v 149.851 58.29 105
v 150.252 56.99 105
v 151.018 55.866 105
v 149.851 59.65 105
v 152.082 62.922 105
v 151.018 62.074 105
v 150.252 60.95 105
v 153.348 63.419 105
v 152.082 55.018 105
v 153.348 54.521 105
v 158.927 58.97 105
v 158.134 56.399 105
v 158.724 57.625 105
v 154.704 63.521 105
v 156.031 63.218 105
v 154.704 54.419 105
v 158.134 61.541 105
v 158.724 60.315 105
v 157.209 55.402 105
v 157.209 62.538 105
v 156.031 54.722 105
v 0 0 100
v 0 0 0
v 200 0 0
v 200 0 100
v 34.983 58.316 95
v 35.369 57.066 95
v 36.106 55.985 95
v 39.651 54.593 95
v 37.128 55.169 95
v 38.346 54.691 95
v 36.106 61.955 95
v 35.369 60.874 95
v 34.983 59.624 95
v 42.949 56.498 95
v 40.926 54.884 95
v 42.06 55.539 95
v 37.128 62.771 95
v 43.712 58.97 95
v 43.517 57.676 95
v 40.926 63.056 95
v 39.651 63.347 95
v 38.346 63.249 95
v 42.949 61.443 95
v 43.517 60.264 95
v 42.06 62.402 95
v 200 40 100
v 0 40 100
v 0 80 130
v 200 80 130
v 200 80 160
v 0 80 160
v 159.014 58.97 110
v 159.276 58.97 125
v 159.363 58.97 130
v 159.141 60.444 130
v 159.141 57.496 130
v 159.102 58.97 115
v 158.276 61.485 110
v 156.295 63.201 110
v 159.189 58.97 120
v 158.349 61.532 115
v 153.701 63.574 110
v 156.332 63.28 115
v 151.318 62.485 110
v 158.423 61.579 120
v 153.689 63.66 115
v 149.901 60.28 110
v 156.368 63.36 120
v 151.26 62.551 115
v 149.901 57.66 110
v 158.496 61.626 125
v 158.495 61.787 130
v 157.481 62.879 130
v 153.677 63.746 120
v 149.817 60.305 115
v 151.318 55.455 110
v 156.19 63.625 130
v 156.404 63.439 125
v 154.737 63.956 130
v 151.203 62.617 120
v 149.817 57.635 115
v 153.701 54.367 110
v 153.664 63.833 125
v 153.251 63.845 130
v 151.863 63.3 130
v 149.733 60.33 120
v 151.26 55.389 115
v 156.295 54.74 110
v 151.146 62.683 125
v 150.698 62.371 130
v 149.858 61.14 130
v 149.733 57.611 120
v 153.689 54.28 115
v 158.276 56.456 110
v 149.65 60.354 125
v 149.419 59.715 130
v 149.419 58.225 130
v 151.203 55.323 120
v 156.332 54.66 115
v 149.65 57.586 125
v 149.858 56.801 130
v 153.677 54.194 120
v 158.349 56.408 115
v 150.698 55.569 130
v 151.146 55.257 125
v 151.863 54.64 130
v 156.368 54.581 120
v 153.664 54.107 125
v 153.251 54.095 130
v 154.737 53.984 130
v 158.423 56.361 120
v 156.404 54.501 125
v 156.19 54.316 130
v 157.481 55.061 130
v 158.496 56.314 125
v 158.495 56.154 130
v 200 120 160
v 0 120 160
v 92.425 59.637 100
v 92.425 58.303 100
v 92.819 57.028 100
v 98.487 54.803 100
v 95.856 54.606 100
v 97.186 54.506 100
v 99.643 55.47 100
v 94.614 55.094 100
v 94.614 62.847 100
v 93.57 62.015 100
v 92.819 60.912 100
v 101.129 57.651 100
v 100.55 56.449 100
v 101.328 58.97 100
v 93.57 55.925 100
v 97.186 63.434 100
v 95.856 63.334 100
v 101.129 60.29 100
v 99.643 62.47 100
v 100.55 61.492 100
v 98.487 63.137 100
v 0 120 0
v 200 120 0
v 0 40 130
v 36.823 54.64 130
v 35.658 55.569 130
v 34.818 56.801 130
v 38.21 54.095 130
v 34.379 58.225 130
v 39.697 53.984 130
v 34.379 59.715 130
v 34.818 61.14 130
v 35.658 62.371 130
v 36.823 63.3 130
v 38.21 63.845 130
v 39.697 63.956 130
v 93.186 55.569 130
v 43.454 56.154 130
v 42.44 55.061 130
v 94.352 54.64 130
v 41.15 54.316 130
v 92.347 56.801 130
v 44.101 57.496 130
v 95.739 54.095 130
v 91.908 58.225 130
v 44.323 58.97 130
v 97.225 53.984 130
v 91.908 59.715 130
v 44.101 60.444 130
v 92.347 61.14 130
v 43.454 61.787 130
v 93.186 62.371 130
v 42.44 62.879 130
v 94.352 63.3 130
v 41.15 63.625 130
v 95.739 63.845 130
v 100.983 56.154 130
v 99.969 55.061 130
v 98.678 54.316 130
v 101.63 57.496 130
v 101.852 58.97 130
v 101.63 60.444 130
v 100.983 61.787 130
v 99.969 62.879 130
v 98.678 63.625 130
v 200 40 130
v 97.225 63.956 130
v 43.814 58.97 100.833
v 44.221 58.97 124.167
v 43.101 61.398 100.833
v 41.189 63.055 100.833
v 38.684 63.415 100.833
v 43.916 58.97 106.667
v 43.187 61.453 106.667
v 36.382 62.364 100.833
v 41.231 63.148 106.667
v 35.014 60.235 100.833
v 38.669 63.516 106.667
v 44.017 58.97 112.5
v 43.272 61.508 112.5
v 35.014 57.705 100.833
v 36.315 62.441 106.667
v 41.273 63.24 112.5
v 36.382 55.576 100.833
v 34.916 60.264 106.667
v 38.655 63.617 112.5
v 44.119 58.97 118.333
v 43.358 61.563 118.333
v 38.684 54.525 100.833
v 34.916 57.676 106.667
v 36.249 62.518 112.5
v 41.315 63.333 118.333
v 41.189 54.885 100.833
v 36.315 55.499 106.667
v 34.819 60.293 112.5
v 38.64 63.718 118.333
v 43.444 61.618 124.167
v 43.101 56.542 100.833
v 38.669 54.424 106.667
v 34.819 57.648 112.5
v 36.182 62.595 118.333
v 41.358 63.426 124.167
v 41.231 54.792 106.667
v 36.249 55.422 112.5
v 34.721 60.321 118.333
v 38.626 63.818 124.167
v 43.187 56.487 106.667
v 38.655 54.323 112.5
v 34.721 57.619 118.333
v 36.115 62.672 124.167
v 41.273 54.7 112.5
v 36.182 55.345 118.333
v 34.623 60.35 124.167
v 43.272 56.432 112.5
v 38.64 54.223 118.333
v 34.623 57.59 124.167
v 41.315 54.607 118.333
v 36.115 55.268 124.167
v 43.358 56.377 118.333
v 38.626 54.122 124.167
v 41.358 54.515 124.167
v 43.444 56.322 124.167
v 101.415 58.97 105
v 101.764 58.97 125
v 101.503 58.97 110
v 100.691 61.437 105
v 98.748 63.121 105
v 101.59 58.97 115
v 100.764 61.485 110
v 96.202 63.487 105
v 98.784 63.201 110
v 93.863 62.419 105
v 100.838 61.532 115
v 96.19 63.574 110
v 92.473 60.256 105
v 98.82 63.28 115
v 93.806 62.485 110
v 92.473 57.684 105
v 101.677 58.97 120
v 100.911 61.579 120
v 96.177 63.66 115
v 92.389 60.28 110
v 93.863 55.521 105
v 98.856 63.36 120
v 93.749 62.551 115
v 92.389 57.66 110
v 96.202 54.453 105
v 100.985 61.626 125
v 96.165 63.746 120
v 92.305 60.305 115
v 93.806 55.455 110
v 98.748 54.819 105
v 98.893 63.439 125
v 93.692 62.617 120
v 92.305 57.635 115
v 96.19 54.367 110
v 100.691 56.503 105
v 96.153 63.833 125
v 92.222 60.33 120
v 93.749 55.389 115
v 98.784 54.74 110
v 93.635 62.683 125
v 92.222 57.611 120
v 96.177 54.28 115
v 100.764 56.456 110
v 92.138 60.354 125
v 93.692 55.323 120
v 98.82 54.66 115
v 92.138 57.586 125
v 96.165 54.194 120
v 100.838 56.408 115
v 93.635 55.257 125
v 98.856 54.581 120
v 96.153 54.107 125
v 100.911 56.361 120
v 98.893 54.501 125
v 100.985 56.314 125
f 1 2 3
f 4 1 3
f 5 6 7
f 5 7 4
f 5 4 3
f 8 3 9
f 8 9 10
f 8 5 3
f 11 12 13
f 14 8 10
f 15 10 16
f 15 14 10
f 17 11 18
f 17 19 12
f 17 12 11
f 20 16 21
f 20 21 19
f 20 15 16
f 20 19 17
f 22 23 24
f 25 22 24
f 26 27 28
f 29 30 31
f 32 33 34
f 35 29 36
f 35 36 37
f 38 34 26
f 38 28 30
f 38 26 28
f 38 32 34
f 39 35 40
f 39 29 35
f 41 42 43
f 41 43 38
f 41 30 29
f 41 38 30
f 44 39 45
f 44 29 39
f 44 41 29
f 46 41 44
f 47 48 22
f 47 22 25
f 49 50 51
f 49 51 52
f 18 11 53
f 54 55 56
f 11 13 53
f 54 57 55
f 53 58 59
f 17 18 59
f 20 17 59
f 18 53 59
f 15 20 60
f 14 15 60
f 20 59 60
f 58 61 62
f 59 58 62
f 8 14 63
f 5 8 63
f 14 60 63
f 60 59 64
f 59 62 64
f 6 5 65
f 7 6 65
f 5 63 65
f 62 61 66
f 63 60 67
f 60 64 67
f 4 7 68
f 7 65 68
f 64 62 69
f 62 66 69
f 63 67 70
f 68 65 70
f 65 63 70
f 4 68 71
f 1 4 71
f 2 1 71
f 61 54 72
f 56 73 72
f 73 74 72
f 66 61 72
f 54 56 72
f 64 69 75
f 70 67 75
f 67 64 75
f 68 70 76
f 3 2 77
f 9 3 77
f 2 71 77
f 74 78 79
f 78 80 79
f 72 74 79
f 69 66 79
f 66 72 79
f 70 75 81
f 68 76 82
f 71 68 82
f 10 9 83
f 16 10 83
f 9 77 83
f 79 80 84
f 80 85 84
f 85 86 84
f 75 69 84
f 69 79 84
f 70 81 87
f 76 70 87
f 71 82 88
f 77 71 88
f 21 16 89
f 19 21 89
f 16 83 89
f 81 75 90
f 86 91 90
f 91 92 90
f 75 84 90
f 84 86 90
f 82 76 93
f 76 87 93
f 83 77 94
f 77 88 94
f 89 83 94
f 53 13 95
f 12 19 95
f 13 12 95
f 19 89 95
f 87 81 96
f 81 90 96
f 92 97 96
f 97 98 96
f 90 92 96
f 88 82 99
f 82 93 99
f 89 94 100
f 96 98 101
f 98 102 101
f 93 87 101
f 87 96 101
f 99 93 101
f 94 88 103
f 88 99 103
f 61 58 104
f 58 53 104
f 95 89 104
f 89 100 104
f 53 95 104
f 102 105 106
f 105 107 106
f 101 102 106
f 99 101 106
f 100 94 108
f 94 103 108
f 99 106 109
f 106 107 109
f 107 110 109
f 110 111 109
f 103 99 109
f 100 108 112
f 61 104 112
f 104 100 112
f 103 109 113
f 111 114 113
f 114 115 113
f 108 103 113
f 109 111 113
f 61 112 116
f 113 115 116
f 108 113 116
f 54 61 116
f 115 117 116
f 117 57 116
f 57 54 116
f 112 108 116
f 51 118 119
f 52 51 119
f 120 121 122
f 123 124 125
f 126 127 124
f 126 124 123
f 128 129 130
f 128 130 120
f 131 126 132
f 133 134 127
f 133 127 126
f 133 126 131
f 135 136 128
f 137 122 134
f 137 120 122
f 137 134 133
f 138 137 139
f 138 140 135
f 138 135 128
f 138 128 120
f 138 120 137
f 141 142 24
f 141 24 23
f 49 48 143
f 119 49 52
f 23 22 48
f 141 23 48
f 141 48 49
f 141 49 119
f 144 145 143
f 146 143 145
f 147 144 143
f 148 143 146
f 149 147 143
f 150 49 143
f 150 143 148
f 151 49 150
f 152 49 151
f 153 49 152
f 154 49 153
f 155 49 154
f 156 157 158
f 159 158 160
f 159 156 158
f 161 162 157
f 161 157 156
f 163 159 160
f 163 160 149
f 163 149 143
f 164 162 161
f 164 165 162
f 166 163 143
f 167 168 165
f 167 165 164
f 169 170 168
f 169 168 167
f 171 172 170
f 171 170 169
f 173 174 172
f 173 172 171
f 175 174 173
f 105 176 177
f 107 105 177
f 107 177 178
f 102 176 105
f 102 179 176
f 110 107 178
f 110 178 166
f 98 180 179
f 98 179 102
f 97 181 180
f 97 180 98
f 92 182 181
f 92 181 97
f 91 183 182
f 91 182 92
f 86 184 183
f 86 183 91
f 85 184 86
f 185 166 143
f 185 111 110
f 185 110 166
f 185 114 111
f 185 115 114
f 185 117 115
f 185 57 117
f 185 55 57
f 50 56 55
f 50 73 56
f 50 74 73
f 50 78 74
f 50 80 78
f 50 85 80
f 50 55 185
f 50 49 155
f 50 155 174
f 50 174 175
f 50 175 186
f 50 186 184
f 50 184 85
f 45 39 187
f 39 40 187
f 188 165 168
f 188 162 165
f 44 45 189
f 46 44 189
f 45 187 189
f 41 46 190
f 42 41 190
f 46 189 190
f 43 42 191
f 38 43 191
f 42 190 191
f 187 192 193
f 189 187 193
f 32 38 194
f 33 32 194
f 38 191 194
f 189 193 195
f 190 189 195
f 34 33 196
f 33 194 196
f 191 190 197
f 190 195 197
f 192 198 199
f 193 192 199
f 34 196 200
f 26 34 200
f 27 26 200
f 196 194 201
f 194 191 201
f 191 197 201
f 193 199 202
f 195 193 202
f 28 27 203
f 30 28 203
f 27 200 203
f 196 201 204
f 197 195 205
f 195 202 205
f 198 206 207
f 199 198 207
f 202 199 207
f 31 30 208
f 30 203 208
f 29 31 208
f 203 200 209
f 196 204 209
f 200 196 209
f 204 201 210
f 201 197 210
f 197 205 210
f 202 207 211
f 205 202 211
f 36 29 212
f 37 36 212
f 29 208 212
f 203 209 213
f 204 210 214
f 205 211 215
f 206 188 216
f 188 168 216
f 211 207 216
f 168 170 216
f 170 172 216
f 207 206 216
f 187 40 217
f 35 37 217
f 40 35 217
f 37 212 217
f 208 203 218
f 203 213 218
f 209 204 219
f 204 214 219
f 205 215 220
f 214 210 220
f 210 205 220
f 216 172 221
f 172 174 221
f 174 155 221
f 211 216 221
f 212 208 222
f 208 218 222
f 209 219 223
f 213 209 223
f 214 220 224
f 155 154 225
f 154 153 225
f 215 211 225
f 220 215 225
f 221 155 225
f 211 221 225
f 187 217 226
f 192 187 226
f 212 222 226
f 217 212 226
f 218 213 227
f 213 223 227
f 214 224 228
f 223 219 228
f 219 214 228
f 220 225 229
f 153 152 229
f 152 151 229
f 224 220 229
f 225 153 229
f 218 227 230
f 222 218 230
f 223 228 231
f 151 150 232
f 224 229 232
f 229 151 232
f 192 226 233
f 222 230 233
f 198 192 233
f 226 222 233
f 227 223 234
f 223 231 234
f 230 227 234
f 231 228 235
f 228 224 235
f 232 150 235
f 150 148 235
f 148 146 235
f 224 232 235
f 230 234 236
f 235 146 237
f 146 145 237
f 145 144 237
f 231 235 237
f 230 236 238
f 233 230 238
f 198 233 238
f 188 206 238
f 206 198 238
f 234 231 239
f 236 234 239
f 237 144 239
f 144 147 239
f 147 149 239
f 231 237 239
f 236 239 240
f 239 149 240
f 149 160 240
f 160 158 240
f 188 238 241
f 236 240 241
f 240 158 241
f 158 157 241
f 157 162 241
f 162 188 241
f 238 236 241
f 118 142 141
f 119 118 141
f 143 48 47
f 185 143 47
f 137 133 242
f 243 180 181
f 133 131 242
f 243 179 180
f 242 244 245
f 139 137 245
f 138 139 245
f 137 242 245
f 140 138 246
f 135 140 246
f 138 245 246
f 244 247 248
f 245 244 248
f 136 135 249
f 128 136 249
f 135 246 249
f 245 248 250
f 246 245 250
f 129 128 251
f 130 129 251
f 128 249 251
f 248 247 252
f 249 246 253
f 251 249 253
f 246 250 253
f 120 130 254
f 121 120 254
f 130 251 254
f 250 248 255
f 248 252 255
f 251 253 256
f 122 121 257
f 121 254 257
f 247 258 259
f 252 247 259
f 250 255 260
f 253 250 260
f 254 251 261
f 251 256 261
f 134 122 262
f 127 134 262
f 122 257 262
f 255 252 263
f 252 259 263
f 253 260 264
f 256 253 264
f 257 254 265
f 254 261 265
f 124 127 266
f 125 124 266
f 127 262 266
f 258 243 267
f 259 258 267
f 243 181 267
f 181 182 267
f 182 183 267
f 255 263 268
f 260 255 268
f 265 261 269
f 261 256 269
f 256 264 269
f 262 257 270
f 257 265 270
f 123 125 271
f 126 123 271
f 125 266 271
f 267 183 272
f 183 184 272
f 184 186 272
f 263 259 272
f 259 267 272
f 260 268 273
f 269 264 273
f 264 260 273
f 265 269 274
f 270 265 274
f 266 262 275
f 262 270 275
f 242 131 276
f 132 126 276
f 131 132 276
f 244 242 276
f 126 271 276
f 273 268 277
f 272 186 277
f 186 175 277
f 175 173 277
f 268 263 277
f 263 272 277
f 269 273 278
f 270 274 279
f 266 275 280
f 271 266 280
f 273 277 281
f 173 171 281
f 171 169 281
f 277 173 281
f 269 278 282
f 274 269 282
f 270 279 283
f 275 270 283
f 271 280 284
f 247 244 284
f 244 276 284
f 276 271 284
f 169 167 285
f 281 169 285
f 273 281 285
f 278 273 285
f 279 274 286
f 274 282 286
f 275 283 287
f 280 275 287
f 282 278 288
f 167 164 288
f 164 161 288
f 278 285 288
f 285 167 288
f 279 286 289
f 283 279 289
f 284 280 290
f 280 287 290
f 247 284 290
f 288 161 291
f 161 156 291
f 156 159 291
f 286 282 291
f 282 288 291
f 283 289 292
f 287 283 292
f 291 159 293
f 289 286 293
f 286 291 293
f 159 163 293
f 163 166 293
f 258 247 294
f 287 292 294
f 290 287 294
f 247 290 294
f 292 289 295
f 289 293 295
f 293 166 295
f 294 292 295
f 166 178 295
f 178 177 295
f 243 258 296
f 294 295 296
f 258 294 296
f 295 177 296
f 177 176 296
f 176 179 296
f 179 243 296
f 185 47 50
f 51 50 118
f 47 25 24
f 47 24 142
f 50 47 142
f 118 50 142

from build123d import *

# Parameters (mm, degrees)
SKETCH_1_W          = 200
SKETCH_1_H          = 40
EXTRUDE_1_DEPTH     = 100
SKETCH_1_3_W        = 200
SKETCH_1_3_H        = 40
EXTRUDE_2_DEPTH     = 130
SKETCH_9_R          = 5
CUT_EXTRUDE_4_DEPTH = 35
CUT_EXTRUDE_4_DRAFT = -1
SKETCH_9_3_R        = 5
CUT_EXTRUDE_5_DEPTH = 25
CUT_EXTRUDE_5_DRAFT = -1
SKETCH_9_4_R        = 5
CUT_EXTRUDE_6_DEPTH = 30
CUT_EXTRUDE_6_DRAFT = -1
SKETCH_10_W         = 200
SKETCH_10_H         = 40
EXTRUDE_3_DEPTH     = 160


with BuildPart() as part:
    # Эскиз1 → Бобышка-Вытянуть1 (new body)
    with BuildSketch(Plane.XY):
        with Locations((100, 20)):
            Rectangle(SKETCH_1_W, SKETCH_1_H)
    extrude(amount=EXTRUDE_1_DEPTH)

    # Эскиз1<3> → Бобышка-Вытянуть2 (add)
    with BuildSketch(Plane.XY):
        with Locations((100, 60)):
            Rectangle(SKETCH_1_3_W, SKETCH_1_3_H)
    extrude(amount=EXTRUDE_2_DEPTH)


with BuildPart() as cut_extrude_4_tool:
    # Эскиз9 → Вырез-Вытянуть4 (with draft: the straight prism first)
    with BuildSketch(Plane(origin=(-3.148281851, 38.970132862, 130), x_dir=(1, 0, 0), z_dir=(0, 0, 1))):
        with Locations((42.471240213, 20)):
            Circle(SKETCH_9_R)
    extrude(amount=-CUT_EXTRUDE_4_DEPTH)
    # Вырез-Вытянуть4: the draft: its side faces are tilted about the plane it starts from
    cut_extrude_4_sides = [cut_extrude_4_tool.faces().sort_by_distance(p)[0] for p in [
        (34.322958362, 58.970132862, 112.5),
    ]]
    draft(cut_extrude_4_sides, Plane(origin=(-3.148281851, 38.970132862, 130), x_dir=(1, 0, 0), z_dir=(0, 0, 1)), CUT_EXTRUDE_4_DRAFT)


with BuildPart() as part_1:
    add(part.part)

    # Вырез-Вытянуть4: cut by cut_extrude_4_tool
    add(cut_extrude_4_tool.part, mode=Mode.SUBTRACT)


with BuildPart() as cut_extrude_5_tool:
    # Эскиз9<3> → Вырез-Вытянуть5 (with draft: the straight prism first)
    with BuildSketch(Plane(origin=(-3.148281851, 38.970132862, 130), x_dir=(1, 0, 0), z_dir=(0, 0, 1))):
        with Locations((157.511612736, 20)):
            Circle(SKETCH_9_3_R)
    extrude(amount=-CUT_EXTRUDE_5_DEPTH)
    # Вырез-Вытянуть5: the draft: its side faces are tilted about the plane it starts from
    cut_extrude_5_sides = [cut_extrude_5_tool.faces().sort_by_distance(p)[0] for p in [
        (149.363330884, 58.970132862, 117.5),
    ]]
    draft(cut_extrude_5_sides, Plane(origin=(-3.148281851, 38.970132862, 130), x_dir=(1, 0, 0), z_dir=(0, 0, 1)), CUT_EXTRUDE_5_DRAFT)


with BuildPart() as part_2:
    add(part_1.part)

    # Вырез-Вытянуть5: cut by cut_extrude_5_tool
    add(cut_extrude_5_tool.part, mode=Mode.SUBTRACT)


with BuildPart() as cut_extrude_6_tool:
    # Эскиз9<4> → Вырез-Вытянуть6 (with draft: the straight prism first)
    with BuildSketch(Plane(origin=(-3.148281851, 38.970132862, 130), x_dir=(1, 0, 0), z_dir=(0, 0, 1))):
        with Locations((100, 20)):
            Circle(SKETCH_9_4_R)
    extrude(amount=-CUT_EXTRUDE_6_DEPTH)
    # Вырез-Вытянуть6: the draft: its side faces are tilted about the plane it starts from
    cut_extrude_6_sides = [cut_extrude_6_tool.faces().sort_by_distance(p)[0] for p in [
        (91.851718149, 58.970132862, 115),
    ]]
    draft(cut_extrude_6_sides, Plane(origin=(-3.148281851, 38.970132862, 130), x_dir=(1, 0, 0), z_dir=(0, 0, 1)), CUT_EXTRUDE_6_DRAFT)


with BuildPart() as part_3:
    add(part_2.part)

    # Вырез-Вытянуть6: cut by cut_extrude_6_tool
    add(cut_extrude_6_tool.part, mode=Mode.SUBTRACT)

    # Эскиз10 → Бобышка-Вытянуть3 (add)
    with BuildSketch(Plane(origin=(0, 0, 0), x_dir=(-1, 0, 0), z_dir=(0, 0, -1))):
        with Locations((-100, 100)):
            Rectangle(SKETCH_10_W, SKETCH_10_H)
    extrude(amount=-EXTRUDE_3_DEPTH)


solid = part_3.part
